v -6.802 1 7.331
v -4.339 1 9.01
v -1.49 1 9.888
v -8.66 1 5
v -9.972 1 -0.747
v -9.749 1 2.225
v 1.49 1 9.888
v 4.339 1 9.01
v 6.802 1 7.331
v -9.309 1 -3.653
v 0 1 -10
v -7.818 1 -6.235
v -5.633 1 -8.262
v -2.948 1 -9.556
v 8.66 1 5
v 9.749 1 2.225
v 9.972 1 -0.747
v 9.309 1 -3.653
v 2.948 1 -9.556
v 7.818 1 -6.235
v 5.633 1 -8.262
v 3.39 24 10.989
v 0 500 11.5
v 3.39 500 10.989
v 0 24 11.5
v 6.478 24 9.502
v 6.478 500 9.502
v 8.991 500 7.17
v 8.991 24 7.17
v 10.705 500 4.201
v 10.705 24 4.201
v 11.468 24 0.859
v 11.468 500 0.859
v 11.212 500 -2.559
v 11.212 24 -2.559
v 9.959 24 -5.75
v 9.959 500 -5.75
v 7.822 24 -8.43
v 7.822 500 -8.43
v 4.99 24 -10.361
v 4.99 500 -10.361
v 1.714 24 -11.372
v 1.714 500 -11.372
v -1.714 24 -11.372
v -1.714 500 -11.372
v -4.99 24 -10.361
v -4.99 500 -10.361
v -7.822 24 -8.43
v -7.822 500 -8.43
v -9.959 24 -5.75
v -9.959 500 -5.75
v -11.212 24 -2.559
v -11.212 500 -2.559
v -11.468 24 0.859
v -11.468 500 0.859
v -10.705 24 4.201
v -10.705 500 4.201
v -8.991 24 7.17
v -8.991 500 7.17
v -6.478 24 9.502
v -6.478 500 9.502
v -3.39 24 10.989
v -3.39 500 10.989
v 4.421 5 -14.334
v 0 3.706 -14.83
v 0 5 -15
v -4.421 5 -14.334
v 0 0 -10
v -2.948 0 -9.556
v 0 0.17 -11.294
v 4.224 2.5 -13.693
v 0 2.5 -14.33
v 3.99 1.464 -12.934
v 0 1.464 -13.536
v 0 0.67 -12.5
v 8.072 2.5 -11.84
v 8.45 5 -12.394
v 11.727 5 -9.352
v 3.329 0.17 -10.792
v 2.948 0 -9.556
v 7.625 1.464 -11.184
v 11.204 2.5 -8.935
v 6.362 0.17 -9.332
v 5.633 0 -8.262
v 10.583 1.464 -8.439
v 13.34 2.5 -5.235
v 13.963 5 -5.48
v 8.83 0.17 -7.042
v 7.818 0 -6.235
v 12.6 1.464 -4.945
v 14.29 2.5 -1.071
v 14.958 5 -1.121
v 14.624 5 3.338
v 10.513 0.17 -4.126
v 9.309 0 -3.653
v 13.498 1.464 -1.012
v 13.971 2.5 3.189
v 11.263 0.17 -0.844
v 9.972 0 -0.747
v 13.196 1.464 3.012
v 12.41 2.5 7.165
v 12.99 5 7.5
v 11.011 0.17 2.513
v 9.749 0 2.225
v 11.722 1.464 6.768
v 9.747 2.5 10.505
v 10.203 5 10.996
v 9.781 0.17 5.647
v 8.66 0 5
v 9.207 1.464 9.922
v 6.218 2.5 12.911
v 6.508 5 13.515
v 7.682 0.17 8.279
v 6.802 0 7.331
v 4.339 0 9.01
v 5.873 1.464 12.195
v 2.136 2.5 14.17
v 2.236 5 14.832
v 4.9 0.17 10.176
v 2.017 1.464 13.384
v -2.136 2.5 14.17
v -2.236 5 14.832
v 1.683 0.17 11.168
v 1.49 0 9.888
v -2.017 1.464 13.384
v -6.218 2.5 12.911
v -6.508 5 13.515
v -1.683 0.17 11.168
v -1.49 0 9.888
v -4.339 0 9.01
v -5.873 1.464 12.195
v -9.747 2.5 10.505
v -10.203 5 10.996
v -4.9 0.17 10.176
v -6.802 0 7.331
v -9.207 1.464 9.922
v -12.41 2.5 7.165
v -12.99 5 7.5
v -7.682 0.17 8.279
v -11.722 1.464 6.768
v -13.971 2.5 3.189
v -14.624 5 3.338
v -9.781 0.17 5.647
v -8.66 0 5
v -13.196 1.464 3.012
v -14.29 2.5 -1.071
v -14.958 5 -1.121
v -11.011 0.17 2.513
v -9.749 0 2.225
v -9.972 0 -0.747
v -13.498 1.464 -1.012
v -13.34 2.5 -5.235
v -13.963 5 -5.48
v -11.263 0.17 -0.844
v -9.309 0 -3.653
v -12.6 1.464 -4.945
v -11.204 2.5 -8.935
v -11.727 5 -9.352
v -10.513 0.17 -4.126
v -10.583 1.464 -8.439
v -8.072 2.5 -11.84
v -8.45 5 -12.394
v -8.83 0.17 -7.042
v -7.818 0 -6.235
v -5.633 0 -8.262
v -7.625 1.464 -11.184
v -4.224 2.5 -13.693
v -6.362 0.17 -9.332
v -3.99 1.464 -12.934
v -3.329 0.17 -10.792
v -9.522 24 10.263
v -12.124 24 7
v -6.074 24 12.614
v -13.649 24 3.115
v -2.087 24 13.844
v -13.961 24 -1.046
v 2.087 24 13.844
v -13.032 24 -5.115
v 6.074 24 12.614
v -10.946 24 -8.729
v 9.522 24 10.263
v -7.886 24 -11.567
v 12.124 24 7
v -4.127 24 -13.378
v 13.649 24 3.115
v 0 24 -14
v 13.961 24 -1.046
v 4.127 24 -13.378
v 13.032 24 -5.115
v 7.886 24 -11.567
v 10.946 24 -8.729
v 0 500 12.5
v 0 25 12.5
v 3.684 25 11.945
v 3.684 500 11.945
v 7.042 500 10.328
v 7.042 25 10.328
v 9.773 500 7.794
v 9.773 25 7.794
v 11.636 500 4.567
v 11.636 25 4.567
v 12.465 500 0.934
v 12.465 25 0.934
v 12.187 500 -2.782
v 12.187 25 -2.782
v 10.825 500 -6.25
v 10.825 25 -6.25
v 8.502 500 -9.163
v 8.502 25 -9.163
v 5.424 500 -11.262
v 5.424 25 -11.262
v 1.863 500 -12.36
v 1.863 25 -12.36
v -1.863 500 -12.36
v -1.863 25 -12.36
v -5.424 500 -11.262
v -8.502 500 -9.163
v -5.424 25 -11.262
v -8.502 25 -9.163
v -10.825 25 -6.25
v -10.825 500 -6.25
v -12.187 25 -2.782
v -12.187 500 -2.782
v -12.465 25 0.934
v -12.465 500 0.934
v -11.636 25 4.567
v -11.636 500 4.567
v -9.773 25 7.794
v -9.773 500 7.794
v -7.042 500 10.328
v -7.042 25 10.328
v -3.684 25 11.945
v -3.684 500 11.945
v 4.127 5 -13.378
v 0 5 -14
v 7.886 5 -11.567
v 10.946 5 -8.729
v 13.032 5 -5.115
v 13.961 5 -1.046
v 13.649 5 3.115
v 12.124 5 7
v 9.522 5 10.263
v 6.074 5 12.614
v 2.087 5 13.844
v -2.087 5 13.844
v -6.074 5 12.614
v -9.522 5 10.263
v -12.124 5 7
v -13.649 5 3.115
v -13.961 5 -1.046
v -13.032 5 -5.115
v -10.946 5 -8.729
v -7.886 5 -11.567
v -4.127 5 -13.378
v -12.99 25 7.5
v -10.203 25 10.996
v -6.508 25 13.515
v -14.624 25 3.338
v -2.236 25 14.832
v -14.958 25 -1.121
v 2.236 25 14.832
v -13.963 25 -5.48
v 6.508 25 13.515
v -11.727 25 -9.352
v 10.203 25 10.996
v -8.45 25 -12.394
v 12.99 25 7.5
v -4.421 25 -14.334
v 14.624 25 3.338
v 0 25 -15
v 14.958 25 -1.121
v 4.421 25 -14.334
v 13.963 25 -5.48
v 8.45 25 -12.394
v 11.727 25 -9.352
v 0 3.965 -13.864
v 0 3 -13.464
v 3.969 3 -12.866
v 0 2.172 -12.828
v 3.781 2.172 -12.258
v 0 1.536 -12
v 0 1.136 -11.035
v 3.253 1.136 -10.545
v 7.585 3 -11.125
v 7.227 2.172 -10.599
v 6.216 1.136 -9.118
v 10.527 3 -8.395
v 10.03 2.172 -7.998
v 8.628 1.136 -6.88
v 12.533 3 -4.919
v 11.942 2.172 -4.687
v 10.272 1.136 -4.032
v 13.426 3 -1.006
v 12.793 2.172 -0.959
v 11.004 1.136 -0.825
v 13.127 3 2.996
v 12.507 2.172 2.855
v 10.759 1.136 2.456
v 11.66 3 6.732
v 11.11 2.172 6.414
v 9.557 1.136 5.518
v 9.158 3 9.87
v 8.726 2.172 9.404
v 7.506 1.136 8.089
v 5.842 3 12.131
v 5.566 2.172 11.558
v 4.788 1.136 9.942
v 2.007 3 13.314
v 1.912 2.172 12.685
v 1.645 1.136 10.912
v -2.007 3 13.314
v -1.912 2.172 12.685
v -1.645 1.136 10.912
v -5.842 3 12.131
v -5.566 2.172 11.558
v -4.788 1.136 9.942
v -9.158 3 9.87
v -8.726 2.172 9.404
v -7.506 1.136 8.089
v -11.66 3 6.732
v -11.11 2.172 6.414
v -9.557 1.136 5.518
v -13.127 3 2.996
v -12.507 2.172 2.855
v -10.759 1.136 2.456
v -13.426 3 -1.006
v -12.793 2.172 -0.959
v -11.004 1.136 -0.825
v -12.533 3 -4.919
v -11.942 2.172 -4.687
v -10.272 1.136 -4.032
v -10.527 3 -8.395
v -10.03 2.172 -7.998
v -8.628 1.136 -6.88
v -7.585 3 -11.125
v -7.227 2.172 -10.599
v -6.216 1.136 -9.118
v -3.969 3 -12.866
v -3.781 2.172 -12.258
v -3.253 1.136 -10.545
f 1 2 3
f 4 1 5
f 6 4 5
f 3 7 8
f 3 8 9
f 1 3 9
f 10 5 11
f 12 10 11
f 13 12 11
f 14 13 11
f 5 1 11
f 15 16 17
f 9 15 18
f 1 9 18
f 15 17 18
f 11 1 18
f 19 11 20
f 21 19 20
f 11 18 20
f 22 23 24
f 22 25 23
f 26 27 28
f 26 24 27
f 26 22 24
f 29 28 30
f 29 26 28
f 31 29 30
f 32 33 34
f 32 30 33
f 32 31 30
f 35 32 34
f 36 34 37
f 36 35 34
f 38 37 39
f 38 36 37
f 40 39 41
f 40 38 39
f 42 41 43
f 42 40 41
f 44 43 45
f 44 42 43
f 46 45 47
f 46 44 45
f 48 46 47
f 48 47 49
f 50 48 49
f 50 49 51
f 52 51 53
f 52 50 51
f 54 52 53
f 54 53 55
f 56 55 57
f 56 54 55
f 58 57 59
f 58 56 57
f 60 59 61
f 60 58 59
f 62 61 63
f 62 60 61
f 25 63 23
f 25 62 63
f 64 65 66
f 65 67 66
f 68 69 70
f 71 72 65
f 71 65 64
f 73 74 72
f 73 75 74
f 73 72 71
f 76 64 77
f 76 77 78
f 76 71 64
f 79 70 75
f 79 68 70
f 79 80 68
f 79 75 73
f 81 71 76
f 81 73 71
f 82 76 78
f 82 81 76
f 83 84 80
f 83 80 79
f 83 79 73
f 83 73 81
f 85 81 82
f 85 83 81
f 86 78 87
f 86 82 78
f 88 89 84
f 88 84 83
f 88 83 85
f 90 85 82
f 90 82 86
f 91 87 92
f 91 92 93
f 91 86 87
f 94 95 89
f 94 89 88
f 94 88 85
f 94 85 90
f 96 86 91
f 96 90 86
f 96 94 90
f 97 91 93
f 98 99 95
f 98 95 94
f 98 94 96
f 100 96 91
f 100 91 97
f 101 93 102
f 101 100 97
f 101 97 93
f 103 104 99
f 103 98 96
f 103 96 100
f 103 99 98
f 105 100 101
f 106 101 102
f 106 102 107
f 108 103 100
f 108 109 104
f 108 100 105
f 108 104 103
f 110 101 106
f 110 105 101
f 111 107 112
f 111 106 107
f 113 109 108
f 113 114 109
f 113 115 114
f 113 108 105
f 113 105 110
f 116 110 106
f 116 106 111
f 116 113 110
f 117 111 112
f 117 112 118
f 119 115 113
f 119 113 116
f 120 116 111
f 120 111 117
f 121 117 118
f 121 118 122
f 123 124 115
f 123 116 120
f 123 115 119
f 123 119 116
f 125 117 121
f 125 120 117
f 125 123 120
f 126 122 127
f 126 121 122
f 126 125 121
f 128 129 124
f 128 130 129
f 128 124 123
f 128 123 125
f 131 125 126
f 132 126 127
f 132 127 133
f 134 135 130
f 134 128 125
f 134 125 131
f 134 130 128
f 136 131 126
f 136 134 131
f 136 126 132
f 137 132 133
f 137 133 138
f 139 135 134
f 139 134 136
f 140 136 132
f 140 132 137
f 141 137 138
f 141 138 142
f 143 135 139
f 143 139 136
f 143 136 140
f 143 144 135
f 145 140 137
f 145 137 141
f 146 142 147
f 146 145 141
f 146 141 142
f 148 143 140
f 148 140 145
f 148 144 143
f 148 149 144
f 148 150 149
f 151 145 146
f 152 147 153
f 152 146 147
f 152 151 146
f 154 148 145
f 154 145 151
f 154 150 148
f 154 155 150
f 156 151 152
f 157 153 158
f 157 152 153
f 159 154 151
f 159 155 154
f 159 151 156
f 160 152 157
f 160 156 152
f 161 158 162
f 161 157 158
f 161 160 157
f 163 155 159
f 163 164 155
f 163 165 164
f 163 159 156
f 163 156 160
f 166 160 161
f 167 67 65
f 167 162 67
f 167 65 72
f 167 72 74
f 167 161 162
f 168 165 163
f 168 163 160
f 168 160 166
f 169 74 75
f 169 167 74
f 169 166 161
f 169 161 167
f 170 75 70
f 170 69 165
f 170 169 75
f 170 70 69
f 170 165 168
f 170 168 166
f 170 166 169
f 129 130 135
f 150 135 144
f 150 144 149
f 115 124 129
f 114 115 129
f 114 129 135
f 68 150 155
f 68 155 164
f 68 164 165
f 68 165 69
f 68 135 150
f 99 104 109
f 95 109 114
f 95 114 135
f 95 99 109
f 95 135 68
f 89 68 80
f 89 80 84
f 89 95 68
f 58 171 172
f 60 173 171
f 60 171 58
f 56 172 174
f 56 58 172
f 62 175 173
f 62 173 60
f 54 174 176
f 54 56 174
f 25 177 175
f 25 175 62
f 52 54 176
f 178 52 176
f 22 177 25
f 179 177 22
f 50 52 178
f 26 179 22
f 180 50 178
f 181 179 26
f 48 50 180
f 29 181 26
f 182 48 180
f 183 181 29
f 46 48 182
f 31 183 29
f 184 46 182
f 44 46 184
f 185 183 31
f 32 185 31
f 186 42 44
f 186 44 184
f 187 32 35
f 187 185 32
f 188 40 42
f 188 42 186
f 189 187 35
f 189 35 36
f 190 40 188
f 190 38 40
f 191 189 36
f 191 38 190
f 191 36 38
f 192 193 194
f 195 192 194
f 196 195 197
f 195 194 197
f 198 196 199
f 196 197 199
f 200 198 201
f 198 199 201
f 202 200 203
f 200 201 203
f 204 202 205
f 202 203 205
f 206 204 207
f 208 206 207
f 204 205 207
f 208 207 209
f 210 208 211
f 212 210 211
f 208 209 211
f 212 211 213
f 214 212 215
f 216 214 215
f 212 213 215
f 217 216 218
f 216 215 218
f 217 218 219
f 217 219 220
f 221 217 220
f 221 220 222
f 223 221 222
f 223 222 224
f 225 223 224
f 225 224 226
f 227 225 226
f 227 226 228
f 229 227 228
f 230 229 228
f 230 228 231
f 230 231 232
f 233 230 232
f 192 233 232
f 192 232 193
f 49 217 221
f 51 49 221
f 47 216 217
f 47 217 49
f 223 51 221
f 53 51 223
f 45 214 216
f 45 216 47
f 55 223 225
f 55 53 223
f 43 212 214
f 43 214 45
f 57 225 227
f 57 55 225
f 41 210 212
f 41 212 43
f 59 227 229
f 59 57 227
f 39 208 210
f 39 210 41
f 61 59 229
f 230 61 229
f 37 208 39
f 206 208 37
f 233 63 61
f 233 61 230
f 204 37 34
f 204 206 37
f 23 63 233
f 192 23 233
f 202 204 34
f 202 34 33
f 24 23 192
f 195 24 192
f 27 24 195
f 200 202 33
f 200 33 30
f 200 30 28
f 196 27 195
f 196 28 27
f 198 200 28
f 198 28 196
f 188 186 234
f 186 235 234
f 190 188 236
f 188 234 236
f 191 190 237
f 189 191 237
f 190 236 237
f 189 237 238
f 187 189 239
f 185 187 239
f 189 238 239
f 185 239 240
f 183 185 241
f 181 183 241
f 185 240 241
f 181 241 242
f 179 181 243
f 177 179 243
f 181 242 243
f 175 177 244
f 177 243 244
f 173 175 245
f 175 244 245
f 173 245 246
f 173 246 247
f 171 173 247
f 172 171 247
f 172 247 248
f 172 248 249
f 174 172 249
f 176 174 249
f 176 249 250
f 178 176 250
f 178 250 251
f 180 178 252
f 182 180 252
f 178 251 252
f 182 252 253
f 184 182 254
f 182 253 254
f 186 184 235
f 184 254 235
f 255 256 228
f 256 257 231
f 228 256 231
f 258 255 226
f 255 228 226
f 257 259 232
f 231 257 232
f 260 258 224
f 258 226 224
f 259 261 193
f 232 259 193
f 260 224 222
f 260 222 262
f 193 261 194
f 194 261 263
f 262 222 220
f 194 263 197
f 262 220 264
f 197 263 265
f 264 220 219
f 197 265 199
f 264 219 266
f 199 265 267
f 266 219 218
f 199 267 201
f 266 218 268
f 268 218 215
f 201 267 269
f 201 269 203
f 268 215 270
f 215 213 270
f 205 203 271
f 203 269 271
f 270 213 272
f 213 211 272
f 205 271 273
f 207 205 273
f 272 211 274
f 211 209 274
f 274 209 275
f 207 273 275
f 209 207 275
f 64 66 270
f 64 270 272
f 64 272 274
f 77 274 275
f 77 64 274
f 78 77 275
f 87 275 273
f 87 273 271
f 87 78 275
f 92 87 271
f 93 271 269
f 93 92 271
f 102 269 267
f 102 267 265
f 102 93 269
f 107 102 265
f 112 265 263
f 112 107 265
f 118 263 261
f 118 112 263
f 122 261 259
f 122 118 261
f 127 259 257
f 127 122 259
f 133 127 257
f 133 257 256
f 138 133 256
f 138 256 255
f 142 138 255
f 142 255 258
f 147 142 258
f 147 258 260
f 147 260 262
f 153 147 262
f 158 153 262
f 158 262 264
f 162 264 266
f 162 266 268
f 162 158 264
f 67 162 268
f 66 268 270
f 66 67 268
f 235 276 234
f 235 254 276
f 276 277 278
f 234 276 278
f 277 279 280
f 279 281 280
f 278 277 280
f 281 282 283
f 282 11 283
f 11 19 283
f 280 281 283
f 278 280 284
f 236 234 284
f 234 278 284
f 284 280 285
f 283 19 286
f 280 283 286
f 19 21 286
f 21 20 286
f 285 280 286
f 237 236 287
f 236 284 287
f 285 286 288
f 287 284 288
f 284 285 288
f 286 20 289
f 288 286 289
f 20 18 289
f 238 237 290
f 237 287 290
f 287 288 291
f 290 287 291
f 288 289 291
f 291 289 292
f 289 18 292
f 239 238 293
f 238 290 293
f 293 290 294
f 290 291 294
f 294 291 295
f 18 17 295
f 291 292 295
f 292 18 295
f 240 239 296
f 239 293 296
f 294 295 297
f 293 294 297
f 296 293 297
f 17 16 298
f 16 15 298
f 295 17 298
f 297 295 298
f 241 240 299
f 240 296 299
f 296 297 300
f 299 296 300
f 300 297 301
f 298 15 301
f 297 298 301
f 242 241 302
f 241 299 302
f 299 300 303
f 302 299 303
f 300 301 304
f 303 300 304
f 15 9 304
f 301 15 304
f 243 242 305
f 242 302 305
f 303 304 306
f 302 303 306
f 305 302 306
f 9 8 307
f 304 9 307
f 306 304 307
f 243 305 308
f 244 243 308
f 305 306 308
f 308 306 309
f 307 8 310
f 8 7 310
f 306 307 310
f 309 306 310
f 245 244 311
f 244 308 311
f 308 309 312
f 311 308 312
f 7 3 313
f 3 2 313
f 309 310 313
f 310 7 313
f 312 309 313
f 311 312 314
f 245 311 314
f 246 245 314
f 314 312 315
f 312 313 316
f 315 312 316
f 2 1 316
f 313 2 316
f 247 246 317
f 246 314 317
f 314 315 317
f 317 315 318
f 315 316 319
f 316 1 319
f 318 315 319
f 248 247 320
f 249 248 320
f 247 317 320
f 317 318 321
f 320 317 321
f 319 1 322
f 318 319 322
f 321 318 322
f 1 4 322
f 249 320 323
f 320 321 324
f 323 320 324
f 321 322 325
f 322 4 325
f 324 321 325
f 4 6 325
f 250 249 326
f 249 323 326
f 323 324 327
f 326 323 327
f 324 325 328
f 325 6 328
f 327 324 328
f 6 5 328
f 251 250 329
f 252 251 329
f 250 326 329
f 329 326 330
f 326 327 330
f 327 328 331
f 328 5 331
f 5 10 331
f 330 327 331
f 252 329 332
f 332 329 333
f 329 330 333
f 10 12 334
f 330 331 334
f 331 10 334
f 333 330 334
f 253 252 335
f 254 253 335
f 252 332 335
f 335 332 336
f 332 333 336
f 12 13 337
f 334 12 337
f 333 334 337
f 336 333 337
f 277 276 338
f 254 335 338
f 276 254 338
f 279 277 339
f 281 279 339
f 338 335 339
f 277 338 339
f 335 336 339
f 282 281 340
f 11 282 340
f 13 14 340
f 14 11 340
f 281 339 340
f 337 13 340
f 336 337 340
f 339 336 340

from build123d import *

# Parameters (mm, degrees)
SKETCH1_R           = 12.5
BOSS_EXTRUDE1_DEPTH = 500
SKETCH3_R           = 15
BOSS_EXTRUDE2_DEPTH = 25
FILLET2_R           = 5
SHELL1_T            = -1


with BuildPart() as part:
    # Sketch1 → Boss-Extrude1 (new body)
    with BuildSketch(Plane(origin=(0, 0, 0), x_dir=(1, 0, 0), z_dir=(0, 1, 0))):
        with Locations(Location((0, 0, 0), (0, 0, 270))):
            Circle(SKETCH1_R)
    extrude(amount=BOSS_EXTRUDE1_DEPTH)

    # Sketch3 → Boss-Extrude2 (add)
    with BuildSketch(Plane.XZ):
        with Locations(Location((0, 0, 0), (0, 0, 270))):
            Circle(SKETCH3_R)
    extrude(amount=-BOSS_EXTRUDE2_DEPTH)

    # Fillet2
    fillet2_edges = [part.edges().sort_by_distance(p)[0] for p in [
        (0, 0, 15),
    ]]
    fillet(fillet2_edges, radius=FILLET2_R)

    # Shell1
    shell1_openings = [part.faces().sort_by_distance(p)[0] for p in [
        (0, 500, 0),
    ]]
    offset(amount=SHELL1_T, openings=shell1_openings, kind=Kind.INTERSECTION)


solid = part.part
